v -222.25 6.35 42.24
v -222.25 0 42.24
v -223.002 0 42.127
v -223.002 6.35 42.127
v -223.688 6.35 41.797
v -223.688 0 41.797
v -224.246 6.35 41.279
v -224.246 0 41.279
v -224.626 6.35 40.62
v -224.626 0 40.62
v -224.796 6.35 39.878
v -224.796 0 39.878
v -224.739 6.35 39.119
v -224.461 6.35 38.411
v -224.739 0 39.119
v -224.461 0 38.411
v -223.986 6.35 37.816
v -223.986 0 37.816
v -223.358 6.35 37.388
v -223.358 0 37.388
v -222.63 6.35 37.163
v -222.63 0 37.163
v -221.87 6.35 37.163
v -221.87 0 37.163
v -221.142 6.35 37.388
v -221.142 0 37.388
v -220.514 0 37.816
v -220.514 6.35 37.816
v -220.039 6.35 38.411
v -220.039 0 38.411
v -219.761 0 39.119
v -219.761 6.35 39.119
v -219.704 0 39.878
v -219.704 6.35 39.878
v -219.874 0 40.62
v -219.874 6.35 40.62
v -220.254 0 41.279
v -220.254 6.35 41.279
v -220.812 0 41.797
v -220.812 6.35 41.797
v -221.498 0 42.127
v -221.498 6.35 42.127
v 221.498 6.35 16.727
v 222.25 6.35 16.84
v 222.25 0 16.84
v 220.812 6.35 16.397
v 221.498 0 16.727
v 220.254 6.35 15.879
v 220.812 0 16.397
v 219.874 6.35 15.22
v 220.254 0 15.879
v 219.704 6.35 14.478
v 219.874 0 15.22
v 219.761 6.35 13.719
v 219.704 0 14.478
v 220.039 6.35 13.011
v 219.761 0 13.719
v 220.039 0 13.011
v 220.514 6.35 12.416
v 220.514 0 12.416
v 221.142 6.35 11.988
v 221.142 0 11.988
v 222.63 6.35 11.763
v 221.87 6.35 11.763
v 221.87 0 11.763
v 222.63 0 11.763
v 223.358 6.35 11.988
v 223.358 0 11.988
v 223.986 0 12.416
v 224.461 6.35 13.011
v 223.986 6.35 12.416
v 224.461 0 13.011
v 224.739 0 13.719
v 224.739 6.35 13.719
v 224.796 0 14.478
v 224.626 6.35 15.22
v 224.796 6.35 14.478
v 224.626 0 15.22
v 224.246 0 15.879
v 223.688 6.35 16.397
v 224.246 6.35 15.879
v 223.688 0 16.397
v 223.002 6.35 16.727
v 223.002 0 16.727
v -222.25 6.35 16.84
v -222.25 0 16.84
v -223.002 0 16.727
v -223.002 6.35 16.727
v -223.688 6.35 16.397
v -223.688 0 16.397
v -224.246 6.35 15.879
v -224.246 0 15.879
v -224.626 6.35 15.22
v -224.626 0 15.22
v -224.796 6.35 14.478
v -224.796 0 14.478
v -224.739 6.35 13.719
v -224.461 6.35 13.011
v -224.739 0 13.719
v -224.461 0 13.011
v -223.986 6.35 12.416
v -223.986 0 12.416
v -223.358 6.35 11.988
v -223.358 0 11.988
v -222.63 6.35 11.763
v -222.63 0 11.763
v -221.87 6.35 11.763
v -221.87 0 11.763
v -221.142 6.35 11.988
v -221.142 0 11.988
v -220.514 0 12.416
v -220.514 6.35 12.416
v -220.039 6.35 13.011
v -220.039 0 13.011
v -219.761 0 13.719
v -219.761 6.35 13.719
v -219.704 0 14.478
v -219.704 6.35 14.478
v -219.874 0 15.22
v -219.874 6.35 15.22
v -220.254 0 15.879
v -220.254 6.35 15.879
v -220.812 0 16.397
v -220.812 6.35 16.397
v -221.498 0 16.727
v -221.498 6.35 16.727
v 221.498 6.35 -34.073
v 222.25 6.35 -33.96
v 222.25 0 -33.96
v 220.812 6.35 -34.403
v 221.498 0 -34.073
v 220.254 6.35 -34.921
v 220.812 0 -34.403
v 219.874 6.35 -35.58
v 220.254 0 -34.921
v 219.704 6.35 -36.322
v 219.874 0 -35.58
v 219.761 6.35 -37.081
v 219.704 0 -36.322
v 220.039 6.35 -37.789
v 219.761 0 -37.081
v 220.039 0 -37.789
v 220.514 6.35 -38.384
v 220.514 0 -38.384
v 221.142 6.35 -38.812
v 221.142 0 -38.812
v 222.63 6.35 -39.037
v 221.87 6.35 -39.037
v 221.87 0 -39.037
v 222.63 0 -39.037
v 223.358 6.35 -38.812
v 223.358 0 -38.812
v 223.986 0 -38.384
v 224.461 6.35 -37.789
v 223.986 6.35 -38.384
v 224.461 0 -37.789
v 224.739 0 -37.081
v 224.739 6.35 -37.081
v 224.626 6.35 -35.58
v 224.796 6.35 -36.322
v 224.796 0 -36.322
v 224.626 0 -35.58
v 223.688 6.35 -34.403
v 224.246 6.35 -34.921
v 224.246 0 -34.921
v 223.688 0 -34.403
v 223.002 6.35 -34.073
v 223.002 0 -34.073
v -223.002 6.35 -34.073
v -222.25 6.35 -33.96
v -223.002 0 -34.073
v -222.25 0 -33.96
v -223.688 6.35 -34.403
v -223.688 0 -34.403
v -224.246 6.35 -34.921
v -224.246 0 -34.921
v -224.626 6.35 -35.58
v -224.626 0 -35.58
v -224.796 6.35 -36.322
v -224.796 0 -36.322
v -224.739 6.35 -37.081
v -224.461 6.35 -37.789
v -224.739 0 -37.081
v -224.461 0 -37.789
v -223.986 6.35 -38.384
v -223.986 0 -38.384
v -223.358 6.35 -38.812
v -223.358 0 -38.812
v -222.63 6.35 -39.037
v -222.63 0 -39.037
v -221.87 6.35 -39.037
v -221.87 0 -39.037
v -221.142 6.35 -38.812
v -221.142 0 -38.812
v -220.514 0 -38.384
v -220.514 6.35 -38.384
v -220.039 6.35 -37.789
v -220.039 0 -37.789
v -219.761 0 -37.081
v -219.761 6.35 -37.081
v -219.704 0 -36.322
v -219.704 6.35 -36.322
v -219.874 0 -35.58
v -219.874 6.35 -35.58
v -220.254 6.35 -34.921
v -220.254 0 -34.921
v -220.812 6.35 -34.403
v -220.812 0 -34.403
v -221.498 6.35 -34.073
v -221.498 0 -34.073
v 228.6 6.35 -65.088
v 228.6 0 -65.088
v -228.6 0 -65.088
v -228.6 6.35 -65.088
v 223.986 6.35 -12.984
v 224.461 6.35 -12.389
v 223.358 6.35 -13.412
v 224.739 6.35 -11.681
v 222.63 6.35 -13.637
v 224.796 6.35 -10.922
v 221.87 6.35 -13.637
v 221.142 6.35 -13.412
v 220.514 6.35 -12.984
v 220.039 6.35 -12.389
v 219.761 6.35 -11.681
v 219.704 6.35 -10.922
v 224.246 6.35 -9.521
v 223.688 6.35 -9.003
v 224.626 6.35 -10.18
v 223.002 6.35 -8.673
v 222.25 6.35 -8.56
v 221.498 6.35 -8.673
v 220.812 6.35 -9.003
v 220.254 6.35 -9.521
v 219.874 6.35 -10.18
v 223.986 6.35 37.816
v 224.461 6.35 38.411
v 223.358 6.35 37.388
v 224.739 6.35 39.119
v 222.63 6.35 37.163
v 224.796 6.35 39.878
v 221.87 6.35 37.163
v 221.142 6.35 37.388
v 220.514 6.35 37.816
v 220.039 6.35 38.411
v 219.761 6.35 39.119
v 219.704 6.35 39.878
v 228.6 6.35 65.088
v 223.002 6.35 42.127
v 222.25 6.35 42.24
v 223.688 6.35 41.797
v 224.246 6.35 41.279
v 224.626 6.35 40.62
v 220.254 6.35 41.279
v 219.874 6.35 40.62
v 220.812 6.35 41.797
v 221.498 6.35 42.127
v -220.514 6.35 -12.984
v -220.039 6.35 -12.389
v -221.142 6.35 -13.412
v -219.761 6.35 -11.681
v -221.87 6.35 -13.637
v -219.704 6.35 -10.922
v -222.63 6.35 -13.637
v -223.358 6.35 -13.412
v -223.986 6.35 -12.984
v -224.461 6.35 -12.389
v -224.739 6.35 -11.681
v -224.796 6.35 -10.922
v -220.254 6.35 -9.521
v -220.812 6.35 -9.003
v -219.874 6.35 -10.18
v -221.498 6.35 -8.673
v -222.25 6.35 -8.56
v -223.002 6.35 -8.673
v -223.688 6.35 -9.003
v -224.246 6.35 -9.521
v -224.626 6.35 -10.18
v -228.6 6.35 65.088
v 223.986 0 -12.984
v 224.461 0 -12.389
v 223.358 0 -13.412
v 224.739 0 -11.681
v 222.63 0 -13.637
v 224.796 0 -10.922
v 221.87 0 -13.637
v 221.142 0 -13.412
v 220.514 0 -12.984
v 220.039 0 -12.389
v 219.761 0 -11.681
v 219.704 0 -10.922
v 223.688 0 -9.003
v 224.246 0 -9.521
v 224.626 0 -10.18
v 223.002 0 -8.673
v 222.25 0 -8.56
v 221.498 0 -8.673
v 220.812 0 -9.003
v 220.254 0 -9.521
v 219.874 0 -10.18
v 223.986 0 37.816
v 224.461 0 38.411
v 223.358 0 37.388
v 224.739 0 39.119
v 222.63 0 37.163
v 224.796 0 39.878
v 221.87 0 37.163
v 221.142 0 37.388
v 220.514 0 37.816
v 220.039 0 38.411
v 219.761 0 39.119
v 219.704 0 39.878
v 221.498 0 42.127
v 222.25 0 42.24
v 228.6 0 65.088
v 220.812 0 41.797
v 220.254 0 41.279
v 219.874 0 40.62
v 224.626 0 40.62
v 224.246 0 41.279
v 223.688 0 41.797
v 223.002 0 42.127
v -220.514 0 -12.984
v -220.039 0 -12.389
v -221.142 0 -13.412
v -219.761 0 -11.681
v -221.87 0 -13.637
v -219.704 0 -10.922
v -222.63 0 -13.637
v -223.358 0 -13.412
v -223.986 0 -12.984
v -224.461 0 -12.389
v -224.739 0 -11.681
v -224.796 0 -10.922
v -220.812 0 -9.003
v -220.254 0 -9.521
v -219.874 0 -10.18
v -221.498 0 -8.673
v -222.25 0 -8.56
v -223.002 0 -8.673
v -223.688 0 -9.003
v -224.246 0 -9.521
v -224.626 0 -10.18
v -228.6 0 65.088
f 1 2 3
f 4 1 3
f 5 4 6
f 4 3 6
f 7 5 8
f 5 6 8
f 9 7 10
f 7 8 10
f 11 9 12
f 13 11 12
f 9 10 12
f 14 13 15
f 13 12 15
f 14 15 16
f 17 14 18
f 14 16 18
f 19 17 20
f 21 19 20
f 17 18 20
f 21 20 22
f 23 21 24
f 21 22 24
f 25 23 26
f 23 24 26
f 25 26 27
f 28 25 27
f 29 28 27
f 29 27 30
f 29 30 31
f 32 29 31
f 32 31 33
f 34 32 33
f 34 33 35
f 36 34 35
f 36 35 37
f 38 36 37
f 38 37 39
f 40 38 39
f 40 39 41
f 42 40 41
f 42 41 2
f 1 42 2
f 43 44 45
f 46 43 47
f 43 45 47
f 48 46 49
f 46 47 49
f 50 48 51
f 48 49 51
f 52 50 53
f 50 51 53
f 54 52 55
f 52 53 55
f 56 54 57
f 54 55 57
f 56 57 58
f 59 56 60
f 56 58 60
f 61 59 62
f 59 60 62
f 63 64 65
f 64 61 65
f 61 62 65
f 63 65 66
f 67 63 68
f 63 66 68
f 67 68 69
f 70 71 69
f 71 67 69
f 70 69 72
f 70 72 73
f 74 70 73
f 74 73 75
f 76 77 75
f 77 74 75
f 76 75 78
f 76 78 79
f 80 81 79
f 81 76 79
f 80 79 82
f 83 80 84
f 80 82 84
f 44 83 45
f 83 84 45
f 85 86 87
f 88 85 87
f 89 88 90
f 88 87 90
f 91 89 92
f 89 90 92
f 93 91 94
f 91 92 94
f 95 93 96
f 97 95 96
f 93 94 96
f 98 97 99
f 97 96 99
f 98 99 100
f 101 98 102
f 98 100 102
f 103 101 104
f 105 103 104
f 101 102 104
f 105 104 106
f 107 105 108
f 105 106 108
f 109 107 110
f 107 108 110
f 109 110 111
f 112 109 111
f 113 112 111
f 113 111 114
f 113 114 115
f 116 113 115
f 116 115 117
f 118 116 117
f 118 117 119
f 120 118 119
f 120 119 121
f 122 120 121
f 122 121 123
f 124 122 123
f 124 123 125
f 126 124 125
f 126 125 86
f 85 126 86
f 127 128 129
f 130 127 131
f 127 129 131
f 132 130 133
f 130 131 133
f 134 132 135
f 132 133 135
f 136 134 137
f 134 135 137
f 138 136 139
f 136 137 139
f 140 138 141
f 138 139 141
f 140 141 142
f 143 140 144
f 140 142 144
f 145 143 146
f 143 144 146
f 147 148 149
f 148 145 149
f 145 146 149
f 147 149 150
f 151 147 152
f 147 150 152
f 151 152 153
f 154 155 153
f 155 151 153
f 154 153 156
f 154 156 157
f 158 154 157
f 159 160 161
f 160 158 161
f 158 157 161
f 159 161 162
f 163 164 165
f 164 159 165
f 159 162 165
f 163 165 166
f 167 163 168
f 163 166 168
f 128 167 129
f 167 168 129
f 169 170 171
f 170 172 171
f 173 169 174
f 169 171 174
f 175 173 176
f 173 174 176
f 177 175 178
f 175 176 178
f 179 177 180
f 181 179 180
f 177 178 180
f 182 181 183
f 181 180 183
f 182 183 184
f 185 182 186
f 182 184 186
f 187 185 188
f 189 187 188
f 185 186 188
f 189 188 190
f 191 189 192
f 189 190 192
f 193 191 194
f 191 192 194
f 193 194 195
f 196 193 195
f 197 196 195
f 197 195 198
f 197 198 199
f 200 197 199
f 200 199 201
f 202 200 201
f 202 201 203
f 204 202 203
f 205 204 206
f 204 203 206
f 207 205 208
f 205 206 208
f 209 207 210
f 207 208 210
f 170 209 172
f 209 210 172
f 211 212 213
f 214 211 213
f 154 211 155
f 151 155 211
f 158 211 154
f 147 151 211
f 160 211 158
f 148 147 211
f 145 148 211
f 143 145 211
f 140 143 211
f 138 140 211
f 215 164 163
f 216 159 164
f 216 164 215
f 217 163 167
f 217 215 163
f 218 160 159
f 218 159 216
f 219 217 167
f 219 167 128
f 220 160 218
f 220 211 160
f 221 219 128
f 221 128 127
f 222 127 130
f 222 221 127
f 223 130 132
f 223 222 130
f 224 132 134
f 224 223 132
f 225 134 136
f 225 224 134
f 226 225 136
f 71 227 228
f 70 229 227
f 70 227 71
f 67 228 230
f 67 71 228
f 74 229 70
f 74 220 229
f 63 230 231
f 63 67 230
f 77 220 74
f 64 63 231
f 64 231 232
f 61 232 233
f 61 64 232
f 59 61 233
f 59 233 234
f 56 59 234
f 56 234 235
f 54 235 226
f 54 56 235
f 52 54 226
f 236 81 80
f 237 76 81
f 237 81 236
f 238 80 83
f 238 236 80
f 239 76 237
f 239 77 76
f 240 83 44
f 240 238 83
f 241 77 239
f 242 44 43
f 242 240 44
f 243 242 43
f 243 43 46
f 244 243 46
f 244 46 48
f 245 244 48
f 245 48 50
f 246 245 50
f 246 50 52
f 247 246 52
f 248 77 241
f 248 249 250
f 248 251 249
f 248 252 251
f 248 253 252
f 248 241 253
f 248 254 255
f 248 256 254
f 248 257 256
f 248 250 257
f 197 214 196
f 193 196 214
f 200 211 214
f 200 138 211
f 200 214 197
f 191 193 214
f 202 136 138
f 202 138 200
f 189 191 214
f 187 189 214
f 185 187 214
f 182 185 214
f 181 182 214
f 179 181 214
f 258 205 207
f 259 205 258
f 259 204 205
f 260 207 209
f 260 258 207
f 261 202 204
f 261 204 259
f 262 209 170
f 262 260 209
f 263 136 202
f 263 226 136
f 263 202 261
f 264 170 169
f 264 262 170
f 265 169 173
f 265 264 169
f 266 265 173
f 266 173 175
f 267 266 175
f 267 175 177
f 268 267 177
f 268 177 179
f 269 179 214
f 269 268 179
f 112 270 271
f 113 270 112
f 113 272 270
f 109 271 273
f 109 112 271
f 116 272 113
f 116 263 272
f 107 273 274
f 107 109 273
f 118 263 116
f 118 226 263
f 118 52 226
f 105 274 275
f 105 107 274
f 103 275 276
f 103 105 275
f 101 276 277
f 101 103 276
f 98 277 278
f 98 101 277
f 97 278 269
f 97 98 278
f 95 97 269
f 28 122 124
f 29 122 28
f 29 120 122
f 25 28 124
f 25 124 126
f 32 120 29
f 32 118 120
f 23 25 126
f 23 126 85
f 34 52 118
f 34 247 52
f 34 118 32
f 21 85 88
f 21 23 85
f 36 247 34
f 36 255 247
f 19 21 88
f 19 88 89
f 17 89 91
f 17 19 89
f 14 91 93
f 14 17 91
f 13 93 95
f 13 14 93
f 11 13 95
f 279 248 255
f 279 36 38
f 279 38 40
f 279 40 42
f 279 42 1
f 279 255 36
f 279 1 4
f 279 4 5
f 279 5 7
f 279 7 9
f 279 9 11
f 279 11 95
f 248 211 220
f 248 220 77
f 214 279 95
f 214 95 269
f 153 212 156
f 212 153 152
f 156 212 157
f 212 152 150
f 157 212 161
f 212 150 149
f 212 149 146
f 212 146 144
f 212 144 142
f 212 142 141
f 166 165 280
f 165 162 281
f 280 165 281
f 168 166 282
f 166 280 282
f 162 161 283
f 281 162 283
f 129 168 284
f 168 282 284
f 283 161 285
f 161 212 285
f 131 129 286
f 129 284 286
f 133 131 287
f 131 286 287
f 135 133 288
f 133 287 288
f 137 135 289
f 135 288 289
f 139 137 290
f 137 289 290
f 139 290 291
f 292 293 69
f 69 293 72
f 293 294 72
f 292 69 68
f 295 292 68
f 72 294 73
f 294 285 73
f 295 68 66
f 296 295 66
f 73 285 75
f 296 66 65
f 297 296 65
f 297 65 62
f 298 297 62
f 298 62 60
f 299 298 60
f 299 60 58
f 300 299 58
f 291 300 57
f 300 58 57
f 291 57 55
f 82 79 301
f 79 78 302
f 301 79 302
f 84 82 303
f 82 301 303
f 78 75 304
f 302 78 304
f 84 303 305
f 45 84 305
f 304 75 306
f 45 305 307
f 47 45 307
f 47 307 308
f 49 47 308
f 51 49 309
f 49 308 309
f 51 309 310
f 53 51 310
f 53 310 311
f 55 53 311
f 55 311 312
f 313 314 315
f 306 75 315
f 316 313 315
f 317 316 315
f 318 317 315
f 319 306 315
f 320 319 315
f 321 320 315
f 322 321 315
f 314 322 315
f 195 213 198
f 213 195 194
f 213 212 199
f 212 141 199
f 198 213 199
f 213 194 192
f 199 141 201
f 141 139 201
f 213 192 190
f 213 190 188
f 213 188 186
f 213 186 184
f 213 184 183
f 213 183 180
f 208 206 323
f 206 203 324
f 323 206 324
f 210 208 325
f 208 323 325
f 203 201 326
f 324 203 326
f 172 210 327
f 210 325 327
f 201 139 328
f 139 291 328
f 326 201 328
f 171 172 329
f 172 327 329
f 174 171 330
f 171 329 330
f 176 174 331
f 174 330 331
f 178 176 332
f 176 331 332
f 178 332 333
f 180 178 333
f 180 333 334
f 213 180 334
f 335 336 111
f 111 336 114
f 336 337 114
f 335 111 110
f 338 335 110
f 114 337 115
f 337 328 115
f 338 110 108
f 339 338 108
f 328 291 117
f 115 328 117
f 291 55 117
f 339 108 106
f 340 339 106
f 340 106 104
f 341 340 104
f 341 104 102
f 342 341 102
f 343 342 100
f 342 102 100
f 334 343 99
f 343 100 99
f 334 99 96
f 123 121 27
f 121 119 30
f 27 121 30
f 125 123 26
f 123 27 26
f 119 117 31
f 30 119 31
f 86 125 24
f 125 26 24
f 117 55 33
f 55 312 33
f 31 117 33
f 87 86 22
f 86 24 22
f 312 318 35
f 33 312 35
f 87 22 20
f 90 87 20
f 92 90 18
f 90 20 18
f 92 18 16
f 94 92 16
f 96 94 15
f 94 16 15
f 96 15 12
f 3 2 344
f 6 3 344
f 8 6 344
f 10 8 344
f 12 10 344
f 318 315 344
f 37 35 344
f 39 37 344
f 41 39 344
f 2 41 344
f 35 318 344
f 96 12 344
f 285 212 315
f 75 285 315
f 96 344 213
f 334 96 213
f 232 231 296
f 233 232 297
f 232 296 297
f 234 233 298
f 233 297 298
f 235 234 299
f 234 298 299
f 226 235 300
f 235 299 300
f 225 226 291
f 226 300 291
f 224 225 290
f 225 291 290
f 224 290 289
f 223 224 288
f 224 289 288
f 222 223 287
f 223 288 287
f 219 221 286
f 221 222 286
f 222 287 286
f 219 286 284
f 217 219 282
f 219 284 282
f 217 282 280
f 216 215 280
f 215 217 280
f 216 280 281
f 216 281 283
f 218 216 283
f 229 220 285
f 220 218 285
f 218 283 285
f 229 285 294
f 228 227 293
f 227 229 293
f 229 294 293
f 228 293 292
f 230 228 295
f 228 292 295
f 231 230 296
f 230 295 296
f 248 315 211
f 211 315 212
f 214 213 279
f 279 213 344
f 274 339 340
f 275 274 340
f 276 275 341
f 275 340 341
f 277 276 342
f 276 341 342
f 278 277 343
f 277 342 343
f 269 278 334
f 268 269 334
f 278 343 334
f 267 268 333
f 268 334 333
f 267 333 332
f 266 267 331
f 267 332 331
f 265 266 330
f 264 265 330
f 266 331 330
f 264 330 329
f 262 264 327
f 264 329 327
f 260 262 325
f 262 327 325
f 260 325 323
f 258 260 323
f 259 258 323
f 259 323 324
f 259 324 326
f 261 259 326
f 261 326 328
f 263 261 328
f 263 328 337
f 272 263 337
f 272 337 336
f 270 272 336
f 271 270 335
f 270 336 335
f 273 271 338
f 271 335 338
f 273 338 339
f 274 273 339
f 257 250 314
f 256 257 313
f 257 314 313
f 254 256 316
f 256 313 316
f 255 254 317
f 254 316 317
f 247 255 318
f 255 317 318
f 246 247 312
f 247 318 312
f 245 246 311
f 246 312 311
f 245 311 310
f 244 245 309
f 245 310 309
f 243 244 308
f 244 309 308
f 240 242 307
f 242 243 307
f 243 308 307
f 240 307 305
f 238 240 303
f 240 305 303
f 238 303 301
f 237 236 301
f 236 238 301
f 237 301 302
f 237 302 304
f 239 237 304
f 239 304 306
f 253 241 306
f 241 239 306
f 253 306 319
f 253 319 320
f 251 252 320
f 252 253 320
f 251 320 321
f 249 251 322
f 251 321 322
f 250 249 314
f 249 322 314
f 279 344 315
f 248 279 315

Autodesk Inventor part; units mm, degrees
ref_plane "YZ Plane" through (0, 0, 0) normal (1, 0, 0) x (0, 1, 0)
ref_plane "XZ Plane" through (0, 0, 0) normal (0, 1, 0) x (-1, 0, 0)
ref_plane "XY Plane" through (0, 0, 0) normal (0, 0, 1) x (1, 0, 0)
sketch "Sketch1" plane through (0, 0, 0) normal (0, 1, 0) x (-1, 0, 0)
  line L0 (228.6, 65.0875) -> (-228.6, 65.0875)
  line L1 (-228.6, 65.0875) -> (-228.6, -65.0875)
  line L2 (-228.6, -65.0875) -> (228.6, -65.0875)
  line L3 (228.6, -65.0875) -> (228.6, 65.0875)
  line L4 (228.6, 65.0875) -> (-228.6, -65.0875) construction
  line L5 (-228.6, 65.0875) -> (228.6, -65.0875) construction
  point P0 (0, 0)
  dimension "d0" = 457.2
  dimension "d1" = 130.175
extrude "Extrusion1" add sketch "Sketch1" along normal blind 6.35
sketch "Sketch2" plane through (0, 6.35, 0) normal (0, 1, 0) x (1, 0, 0)
  line L0 (-228.6, -65.0875) -> (228.6, -65.0875) construction
  line L1 (-222.25, -65.0875) -> (-222.25, 65.0875) construction
  line L2 (228.6, 65.0875) -> (-228.6, 65.0875) construction
  line L3 (-228.6, 65.0875) -> (-228.6, -65.0875) projected
  point P0 (0, 0)
  point P1 (-222.25, -39.6875)
  point P2 (-222.25, -14.2875)
  point P3 (-222.25, 11.1125)
  point P4 (-222.25, 36.5125)
  dimension "d4" = 6.35
  dimension "d5" = 25.4
  dimension "d8" = 25.4
hole "Hole1" at (-222.25, 6.35, 39.6875) at (-222.25, 6.35, 14.2875) at (-222.25, 6.35, -11.1125) at (-222.25, 6.35, -36.5125) direction (0, -1, 0) diameter 5.1054 end through all clearance for "Flat Head Machine Screw (82)" size "#10" standard "Ansi Unified Screw Threads"
mirror "Mirror1" about plane through (0, 0, 0) normal (1, 0, 0) of "Hole1"
properties part number "AluminumPlateForWinch" material "Aluminum 6061"
